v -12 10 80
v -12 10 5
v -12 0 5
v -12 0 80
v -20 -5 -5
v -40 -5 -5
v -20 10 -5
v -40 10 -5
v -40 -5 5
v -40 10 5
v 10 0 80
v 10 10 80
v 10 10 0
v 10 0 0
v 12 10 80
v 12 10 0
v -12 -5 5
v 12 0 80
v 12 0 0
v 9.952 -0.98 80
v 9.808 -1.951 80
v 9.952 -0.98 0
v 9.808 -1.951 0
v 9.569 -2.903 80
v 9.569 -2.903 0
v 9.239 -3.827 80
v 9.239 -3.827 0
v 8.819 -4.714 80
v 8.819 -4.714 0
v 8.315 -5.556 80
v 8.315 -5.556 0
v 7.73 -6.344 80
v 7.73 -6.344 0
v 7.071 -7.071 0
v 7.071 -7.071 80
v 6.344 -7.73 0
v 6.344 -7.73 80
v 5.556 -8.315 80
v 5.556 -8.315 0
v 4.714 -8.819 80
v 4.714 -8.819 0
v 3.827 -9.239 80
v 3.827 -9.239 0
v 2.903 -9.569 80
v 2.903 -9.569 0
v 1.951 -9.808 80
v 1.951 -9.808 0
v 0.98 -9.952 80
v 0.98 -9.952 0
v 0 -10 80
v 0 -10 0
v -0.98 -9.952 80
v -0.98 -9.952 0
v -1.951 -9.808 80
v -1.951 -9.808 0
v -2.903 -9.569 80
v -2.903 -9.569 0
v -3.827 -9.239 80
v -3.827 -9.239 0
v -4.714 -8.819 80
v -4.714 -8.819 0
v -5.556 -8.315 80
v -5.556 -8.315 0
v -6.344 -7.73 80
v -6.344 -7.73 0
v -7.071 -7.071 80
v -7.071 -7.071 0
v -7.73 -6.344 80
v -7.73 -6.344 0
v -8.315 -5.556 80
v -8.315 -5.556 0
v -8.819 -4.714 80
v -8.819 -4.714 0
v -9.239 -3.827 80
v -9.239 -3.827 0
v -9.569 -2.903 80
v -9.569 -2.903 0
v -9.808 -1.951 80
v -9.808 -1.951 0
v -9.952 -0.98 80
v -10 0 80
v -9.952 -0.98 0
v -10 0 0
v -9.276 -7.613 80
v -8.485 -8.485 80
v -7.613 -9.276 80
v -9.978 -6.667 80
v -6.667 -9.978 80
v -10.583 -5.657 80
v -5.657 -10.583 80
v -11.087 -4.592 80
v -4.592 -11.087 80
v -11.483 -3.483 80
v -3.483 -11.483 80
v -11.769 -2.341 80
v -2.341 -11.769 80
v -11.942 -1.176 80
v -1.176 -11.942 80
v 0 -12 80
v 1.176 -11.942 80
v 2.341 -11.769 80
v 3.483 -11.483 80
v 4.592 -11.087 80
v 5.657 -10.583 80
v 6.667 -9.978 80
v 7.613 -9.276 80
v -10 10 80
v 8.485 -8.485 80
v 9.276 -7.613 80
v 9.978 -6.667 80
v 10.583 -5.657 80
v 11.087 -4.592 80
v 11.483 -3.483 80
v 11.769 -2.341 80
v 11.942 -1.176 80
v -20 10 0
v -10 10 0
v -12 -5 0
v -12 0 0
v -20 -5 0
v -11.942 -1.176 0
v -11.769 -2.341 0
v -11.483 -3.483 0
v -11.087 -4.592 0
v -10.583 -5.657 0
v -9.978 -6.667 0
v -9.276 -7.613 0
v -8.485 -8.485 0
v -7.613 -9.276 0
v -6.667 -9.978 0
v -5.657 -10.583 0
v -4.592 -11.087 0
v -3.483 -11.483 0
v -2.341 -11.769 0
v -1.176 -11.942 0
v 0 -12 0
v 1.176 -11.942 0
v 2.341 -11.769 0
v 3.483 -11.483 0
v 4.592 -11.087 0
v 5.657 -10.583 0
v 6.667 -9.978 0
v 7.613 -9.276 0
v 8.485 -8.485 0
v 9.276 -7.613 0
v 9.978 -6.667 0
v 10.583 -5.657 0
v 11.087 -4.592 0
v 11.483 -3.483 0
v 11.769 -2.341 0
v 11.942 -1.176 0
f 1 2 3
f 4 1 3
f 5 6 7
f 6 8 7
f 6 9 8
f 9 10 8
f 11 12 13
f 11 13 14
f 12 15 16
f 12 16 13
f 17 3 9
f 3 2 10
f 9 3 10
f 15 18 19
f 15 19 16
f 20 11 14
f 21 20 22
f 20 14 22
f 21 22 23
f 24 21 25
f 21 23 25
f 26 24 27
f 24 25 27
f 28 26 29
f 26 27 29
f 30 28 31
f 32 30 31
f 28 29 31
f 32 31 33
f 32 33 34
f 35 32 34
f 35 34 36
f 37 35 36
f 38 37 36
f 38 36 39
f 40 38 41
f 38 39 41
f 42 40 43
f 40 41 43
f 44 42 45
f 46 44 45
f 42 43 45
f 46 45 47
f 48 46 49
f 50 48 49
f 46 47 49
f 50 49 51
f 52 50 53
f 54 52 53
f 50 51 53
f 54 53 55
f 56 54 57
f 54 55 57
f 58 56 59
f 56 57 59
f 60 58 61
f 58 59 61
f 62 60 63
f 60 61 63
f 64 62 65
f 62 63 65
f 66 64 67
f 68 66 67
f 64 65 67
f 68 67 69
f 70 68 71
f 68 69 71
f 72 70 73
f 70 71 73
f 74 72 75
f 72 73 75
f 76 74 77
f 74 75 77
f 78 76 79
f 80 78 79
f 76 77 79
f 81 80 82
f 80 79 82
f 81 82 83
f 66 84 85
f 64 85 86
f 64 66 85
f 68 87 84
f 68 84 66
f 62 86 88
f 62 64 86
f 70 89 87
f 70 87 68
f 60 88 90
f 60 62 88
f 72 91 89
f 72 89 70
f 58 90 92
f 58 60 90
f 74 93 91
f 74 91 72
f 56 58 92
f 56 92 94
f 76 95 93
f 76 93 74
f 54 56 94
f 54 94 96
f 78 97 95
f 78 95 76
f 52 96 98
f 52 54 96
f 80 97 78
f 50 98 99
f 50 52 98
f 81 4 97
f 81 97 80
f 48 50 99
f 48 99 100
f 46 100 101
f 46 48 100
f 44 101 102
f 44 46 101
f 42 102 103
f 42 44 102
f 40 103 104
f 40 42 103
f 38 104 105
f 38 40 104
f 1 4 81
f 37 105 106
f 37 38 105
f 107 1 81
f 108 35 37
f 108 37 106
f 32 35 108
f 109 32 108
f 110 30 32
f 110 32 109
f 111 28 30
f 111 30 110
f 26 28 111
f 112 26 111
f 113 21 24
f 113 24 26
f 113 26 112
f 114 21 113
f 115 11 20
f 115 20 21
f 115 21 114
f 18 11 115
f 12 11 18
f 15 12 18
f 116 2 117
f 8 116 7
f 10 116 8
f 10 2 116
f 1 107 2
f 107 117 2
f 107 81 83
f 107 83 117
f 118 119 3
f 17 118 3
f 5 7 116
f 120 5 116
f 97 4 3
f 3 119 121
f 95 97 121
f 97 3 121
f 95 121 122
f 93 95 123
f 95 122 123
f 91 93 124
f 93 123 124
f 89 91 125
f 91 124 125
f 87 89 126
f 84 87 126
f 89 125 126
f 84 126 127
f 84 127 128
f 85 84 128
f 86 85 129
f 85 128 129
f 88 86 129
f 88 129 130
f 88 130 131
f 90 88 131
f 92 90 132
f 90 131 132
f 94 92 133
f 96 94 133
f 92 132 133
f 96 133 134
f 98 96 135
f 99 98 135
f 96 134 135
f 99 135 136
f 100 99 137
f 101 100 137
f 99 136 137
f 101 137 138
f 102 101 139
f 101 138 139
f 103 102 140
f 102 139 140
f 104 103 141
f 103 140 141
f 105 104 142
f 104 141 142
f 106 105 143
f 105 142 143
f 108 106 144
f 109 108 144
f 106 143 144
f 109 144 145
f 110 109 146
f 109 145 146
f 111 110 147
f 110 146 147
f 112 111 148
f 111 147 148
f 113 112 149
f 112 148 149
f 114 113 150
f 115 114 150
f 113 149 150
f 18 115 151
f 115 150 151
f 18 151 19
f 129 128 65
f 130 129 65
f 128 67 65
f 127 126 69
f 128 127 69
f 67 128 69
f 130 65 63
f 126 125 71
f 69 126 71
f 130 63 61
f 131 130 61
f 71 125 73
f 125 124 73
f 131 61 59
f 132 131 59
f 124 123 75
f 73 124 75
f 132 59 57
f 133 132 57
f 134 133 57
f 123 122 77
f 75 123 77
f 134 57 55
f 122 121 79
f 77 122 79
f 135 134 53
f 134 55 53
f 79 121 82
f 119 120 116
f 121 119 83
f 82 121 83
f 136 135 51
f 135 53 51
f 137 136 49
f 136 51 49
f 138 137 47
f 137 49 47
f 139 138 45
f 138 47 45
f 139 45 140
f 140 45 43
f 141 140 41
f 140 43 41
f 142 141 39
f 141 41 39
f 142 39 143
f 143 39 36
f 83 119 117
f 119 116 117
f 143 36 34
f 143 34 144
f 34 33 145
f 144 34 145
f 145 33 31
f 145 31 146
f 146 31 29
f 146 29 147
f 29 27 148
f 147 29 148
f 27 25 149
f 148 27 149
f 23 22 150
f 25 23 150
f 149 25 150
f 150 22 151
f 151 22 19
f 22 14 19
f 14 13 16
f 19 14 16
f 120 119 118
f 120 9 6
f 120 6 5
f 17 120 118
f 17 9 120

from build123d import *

# Parameters (mm, degrees)
BOSS_EXTRUDE1_DEPTH = 80
SKETCH2_W           = 30
SKETCH2_H           = 10
BOSS_EXTRUDE2_DEPTH = 5
SKETCH3_W           = 20
SKETCH3_H           = 10
BOSS_EXTRUDE3_DEPTH = 5
BOSS_EXTRUDE4_DEPTH = 5


with BuildPart() as part:
    # Sketch1 → Boss-Extrude1 (new body)
    with BuildSketch(Plane.XY):
        with BuildLine():
            Line((-10, 0), (-10, 10))
            Line((-10, 10), (-12, 10))
            Line((-12, 10), (-12, 0))
            ThreePointArc((-12, 0), (0, -12), (12, 0))
            Line((12, 0), (12, 10))
            Line((12, 10), (10, 10))
            Line((10, 10), (10, 0))
            ThreePointArc((10, 0), (0, -10), (-10, 0))
        make_face()
    extrude(amount=BOSS_EXTRUDE1_DEPTH)

    # Sketch2 → Boss-Extrude2 (add)
    with BuildSketch(Plane(origin=(0, 0, 0), x_dir=(-1, 0, 0), z_dir=(0, 0, -1))):
        with Locations((25, 5)):
            Rectangle(SKETCH2_W, SKETCH2_H)
    extrude(amount=-BOSS_EXTRUDE2_DEPTH)

    # Sketch3 → Boss-Extrude3 (add)
    with BuildSketch(Plane(origin=(0, 0, 0), x_dir=(-1, 0, 0), z_dir=(0, 0, -1))):
        with Locations((30, 5)):
            Rectangle(SKETCH3_W, SKETCH3_H)
    extrude(amount=BOSS_EXTRUDE3_DEPTH)

    # Sketch4 → Boss-Extrude4 (add)
    with BuildSketch(Plane.XZ):
        Polygon((-12, 0), (-12, 5), (-40, 5), (-40, -5), (-20, -5), (-20, 0), align=None)
    extrude(amount=BOSS_EXTRUDE4_DEPTH)


solid = part.part
